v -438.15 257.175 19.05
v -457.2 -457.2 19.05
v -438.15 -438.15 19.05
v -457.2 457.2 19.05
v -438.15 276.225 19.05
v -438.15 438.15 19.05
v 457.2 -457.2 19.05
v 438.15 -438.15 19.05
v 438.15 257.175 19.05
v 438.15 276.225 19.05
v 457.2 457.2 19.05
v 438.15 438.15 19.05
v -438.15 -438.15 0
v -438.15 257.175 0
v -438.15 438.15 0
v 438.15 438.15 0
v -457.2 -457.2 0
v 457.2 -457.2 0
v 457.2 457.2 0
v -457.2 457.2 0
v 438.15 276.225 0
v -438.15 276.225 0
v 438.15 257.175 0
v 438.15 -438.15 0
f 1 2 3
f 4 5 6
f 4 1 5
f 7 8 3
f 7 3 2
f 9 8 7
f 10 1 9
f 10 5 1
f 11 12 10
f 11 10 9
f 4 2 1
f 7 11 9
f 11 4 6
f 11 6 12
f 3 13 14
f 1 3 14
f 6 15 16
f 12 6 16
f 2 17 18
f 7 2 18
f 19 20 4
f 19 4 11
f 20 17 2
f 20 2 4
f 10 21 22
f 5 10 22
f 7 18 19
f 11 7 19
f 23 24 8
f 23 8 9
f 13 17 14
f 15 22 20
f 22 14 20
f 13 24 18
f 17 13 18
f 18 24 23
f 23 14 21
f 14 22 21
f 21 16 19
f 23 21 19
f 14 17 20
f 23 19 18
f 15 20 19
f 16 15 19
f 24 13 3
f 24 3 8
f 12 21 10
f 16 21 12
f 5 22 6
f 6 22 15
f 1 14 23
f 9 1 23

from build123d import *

# Parameters (mm, degrees)
F0_W     = 914.4
F0_H     = 914.4
F0_W_2   = 876.3
F0_H_2   = 876.3
F1_DEPTH = 19.05
F3_DEPTH = 19.05


with BuildPart() as f1:
    # F0 (on Top) → F1 (new body)
    with BuildSketch(Plane.XY):
        Rectangle(F0_W, F0_H)
        Rectangle(F0_W_2, F0_H_2, mode=Mode.SUBTRACT)
    extrude(amount=F1_DEPTH)

    # F2 (on Top) → F3 (join)
    with BuildSketch(Plane.XY):
        Polygon((438.15, 257.175), (438.15, 276.225), (-438.15, 276.225), (-438.15, 257.175), (0, 257.175), align=None)
    extrude(amount=F3_DEPTH)


solid = f1.part
